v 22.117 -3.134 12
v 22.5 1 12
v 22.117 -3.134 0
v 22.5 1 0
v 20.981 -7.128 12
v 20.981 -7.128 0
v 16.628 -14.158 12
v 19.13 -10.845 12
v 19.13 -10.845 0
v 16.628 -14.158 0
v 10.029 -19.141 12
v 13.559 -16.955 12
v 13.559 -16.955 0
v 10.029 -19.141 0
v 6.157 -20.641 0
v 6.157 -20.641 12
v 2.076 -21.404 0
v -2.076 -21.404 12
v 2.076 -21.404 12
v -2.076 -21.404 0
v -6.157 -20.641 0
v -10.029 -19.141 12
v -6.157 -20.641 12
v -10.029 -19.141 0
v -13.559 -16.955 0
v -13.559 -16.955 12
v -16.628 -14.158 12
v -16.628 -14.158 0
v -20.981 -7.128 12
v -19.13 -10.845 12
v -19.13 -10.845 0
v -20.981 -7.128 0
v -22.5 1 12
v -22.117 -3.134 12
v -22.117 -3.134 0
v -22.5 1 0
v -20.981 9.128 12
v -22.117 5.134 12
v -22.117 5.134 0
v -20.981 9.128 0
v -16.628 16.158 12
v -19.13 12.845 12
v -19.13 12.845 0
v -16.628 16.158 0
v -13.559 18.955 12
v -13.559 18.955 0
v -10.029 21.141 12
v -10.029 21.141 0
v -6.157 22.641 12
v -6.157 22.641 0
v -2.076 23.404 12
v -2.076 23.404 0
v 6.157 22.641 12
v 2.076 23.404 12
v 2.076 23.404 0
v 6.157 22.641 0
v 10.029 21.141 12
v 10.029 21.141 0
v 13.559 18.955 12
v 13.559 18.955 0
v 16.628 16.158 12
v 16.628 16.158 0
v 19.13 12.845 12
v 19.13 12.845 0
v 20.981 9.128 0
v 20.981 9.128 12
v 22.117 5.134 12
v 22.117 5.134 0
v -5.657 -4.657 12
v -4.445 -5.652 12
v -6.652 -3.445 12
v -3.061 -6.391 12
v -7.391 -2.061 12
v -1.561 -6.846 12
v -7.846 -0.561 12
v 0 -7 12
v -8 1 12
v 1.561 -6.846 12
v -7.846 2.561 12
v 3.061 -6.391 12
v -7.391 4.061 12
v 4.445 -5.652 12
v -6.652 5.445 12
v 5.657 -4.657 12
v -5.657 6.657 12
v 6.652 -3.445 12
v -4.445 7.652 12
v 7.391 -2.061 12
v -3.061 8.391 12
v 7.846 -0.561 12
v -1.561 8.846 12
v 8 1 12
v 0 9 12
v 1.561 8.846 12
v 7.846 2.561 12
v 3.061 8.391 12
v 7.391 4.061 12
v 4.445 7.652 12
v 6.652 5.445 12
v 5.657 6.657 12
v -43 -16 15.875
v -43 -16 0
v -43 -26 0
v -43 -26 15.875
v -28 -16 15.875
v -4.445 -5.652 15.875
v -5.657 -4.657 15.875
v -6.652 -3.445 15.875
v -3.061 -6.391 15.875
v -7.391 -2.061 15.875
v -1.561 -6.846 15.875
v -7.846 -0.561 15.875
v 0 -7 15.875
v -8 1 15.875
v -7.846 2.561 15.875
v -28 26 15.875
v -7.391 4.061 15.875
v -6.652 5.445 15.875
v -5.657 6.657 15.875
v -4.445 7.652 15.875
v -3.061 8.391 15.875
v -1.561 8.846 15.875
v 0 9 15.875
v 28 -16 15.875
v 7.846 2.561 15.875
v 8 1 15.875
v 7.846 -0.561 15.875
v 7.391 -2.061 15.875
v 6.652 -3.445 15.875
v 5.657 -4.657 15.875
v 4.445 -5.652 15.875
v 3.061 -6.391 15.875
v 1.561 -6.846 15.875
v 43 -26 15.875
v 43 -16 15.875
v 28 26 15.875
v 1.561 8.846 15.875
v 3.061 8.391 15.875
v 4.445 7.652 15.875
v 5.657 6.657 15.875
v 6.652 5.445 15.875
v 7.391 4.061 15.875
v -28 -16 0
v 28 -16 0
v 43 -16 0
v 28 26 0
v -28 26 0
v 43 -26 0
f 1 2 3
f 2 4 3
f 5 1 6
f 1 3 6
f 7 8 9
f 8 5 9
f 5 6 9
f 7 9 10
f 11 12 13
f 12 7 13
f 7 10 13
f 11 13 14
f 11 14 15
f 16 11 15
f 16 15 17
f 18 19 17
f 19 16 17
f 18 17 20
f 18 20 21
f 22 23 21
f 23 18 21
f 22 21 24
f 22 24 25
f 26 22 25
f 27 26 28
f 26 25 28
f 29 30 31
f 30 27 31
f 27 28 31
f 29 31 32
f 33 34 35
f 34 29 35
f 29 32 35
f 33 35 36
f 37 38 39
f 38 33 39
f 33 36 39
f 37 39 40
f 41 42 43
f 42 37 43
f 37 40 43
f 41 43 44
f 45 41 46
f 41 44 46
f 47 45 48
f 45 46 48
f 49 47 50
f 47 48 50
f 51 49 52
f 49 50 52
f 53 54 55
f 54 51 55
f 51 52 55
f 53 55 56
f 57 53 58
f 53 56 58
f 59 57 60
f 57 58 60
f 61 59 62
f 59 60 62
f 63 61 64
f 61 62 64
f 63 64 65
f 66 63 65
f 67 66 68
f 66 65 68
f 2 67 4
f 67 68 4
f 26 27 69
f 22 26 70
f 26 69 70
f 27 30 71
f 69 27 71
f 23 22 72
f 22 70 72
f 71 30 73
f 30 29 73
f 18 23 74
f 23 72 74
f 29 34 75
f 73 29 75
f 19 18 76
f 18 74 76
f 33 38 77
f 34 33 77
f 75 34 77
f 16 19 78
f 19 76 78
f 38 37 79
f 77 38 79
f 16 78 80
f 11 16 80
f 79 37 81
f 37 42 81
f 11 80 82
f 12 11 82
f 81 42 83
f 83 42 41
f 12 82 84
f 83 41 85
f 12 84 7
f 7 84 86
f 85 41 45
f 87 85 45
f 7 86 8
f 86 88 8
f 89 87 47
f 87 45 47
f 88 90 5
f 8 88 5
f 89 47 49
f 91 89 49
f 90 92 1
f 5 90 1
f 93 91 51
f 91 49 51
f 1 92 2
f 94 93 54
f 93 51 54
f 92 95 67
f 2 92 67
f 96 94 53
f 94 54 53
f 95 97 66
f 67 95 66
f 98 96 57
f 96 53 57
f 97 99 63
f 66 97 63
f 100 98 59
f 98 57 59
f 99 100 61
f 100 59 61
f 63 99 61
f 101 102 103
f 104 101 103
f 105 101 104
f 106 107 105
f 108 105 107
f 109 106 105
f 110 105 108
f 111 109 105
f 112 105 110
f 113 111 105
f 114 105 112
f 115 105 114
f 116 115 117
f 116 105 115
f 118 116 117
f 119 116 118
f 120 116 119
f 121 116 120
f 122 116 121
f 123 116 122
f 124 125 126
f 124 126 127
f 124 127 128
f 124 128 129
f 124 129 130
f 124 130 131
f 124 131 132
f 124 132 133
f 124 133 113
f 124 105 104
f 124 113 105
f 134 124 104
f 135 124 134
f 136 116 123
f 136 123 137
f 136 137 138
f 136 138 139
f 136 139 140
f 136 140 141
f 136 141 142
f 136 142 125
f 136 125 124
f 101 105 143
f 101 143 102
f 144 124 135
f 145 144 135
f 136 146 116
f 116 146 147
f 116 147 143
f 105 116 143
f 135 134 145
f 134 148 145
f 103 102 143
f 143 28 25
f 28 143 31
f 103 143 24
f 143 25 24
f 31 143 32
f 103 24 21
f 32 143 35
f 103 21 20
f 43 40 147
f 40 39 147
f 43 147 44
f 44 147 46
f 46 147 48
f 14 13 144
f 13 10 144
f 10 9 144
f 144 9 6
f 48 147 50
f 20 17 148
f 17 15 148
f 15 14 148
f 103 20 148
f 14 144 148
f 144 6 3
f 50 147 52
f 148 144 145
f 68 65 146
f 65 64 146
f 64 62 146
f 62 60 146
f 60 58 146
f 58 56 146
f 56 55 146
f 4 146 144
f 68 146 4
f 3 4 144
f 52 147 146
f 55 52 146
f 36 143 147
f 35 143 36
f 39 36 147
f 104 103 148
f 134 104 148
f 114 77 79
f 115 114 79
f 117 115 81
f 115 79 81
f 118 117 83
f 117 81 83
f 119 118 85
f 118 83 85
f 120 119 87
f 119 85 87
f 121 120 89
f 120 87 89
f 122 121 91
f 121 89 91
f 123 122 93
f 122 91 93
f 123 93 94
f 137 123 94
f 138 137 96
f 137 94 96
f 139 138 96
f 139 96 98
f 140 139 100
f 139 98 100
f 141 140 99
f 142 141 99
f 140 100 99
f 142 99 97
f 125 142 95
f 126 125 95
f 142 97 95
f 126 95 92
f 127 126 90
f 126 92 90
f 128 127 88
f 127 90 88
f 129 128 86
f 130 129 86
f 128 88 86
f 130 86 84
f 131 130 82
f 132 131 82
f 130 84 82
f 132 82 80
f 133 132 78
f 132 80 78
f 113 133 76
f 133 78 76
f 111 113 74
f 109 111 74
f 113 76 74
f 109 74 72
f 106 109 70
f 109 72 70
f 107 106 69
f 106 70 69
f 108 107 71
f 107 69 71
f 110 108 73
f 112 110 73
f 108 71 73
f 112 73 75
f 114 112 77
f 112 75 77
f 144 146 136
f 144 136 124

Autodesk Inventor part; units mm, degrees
ref_plane "YZ Plane" through (0, 0, 0) normal (1, 0, 0) x (0, 1, 0)
ref_plane "XZ Plane" through (0, 0, 0) normal (0, 1, 0) x (-1, 0, 0)
ref_plane "XY Plane" through (0, 0, 0) normal (0, 0, 1) x (1, 0, 0)
sketch "Sketch1" plane through (0, 0, 0) normal (0, 0, 1) x (1, 0, 0)
  line L0 (-43, -26) -> (43, -26)
  line L1 (43, -26) -> (43, -16)
  line L2 (28, 26) -> (-28, 26)
  line L3 (-43, -16) -> (-43, -26)
  line L4 (-28, 26) -> (-28, -16)
  line L5 (-28, -16) -> (-43, -16)
  line L6 (28, 26) -> (28, -16)
  line L7 (28, -16) -> (43, -16)
  circle A0 centre (0, 1) radius 22.5
  point P0 (0, 0)
  point P1 (35.5, -16)
  dimension "d4" = 52
  dimension "d5" = 42
  dimension "d6" = 56
  dimension "d7" = 86
  dimension "d8" = 10
  dimension "d9" = 27
  dimension "d10" = 45
extrude "Extrusion1" add sketch "Sketch1" along normal blind 15.875
sketch "Sketch2" plane through (0, 0, 15.875) normal (0, 0, 1) x (1, 0, 0)
  circle A0 centre (0, 1) radius 22.5 projected
  point P0 (0, 0)
extrude "Extrusion2" add sketch "Sketch2" against normal blind 3.875
sketch "Sketch3" plane through (0, 1, 12) normal (0, 0, -1) x (-1, 0, 0)
  circle A0 centre (0, 0) radius 8
  point P0 (0, -1)
  dimension "d15" = 16
extrude "Extrusion3" cut sketch "Sketch3" against normal blind 3.875
properties part number "Dudukan PG45"
